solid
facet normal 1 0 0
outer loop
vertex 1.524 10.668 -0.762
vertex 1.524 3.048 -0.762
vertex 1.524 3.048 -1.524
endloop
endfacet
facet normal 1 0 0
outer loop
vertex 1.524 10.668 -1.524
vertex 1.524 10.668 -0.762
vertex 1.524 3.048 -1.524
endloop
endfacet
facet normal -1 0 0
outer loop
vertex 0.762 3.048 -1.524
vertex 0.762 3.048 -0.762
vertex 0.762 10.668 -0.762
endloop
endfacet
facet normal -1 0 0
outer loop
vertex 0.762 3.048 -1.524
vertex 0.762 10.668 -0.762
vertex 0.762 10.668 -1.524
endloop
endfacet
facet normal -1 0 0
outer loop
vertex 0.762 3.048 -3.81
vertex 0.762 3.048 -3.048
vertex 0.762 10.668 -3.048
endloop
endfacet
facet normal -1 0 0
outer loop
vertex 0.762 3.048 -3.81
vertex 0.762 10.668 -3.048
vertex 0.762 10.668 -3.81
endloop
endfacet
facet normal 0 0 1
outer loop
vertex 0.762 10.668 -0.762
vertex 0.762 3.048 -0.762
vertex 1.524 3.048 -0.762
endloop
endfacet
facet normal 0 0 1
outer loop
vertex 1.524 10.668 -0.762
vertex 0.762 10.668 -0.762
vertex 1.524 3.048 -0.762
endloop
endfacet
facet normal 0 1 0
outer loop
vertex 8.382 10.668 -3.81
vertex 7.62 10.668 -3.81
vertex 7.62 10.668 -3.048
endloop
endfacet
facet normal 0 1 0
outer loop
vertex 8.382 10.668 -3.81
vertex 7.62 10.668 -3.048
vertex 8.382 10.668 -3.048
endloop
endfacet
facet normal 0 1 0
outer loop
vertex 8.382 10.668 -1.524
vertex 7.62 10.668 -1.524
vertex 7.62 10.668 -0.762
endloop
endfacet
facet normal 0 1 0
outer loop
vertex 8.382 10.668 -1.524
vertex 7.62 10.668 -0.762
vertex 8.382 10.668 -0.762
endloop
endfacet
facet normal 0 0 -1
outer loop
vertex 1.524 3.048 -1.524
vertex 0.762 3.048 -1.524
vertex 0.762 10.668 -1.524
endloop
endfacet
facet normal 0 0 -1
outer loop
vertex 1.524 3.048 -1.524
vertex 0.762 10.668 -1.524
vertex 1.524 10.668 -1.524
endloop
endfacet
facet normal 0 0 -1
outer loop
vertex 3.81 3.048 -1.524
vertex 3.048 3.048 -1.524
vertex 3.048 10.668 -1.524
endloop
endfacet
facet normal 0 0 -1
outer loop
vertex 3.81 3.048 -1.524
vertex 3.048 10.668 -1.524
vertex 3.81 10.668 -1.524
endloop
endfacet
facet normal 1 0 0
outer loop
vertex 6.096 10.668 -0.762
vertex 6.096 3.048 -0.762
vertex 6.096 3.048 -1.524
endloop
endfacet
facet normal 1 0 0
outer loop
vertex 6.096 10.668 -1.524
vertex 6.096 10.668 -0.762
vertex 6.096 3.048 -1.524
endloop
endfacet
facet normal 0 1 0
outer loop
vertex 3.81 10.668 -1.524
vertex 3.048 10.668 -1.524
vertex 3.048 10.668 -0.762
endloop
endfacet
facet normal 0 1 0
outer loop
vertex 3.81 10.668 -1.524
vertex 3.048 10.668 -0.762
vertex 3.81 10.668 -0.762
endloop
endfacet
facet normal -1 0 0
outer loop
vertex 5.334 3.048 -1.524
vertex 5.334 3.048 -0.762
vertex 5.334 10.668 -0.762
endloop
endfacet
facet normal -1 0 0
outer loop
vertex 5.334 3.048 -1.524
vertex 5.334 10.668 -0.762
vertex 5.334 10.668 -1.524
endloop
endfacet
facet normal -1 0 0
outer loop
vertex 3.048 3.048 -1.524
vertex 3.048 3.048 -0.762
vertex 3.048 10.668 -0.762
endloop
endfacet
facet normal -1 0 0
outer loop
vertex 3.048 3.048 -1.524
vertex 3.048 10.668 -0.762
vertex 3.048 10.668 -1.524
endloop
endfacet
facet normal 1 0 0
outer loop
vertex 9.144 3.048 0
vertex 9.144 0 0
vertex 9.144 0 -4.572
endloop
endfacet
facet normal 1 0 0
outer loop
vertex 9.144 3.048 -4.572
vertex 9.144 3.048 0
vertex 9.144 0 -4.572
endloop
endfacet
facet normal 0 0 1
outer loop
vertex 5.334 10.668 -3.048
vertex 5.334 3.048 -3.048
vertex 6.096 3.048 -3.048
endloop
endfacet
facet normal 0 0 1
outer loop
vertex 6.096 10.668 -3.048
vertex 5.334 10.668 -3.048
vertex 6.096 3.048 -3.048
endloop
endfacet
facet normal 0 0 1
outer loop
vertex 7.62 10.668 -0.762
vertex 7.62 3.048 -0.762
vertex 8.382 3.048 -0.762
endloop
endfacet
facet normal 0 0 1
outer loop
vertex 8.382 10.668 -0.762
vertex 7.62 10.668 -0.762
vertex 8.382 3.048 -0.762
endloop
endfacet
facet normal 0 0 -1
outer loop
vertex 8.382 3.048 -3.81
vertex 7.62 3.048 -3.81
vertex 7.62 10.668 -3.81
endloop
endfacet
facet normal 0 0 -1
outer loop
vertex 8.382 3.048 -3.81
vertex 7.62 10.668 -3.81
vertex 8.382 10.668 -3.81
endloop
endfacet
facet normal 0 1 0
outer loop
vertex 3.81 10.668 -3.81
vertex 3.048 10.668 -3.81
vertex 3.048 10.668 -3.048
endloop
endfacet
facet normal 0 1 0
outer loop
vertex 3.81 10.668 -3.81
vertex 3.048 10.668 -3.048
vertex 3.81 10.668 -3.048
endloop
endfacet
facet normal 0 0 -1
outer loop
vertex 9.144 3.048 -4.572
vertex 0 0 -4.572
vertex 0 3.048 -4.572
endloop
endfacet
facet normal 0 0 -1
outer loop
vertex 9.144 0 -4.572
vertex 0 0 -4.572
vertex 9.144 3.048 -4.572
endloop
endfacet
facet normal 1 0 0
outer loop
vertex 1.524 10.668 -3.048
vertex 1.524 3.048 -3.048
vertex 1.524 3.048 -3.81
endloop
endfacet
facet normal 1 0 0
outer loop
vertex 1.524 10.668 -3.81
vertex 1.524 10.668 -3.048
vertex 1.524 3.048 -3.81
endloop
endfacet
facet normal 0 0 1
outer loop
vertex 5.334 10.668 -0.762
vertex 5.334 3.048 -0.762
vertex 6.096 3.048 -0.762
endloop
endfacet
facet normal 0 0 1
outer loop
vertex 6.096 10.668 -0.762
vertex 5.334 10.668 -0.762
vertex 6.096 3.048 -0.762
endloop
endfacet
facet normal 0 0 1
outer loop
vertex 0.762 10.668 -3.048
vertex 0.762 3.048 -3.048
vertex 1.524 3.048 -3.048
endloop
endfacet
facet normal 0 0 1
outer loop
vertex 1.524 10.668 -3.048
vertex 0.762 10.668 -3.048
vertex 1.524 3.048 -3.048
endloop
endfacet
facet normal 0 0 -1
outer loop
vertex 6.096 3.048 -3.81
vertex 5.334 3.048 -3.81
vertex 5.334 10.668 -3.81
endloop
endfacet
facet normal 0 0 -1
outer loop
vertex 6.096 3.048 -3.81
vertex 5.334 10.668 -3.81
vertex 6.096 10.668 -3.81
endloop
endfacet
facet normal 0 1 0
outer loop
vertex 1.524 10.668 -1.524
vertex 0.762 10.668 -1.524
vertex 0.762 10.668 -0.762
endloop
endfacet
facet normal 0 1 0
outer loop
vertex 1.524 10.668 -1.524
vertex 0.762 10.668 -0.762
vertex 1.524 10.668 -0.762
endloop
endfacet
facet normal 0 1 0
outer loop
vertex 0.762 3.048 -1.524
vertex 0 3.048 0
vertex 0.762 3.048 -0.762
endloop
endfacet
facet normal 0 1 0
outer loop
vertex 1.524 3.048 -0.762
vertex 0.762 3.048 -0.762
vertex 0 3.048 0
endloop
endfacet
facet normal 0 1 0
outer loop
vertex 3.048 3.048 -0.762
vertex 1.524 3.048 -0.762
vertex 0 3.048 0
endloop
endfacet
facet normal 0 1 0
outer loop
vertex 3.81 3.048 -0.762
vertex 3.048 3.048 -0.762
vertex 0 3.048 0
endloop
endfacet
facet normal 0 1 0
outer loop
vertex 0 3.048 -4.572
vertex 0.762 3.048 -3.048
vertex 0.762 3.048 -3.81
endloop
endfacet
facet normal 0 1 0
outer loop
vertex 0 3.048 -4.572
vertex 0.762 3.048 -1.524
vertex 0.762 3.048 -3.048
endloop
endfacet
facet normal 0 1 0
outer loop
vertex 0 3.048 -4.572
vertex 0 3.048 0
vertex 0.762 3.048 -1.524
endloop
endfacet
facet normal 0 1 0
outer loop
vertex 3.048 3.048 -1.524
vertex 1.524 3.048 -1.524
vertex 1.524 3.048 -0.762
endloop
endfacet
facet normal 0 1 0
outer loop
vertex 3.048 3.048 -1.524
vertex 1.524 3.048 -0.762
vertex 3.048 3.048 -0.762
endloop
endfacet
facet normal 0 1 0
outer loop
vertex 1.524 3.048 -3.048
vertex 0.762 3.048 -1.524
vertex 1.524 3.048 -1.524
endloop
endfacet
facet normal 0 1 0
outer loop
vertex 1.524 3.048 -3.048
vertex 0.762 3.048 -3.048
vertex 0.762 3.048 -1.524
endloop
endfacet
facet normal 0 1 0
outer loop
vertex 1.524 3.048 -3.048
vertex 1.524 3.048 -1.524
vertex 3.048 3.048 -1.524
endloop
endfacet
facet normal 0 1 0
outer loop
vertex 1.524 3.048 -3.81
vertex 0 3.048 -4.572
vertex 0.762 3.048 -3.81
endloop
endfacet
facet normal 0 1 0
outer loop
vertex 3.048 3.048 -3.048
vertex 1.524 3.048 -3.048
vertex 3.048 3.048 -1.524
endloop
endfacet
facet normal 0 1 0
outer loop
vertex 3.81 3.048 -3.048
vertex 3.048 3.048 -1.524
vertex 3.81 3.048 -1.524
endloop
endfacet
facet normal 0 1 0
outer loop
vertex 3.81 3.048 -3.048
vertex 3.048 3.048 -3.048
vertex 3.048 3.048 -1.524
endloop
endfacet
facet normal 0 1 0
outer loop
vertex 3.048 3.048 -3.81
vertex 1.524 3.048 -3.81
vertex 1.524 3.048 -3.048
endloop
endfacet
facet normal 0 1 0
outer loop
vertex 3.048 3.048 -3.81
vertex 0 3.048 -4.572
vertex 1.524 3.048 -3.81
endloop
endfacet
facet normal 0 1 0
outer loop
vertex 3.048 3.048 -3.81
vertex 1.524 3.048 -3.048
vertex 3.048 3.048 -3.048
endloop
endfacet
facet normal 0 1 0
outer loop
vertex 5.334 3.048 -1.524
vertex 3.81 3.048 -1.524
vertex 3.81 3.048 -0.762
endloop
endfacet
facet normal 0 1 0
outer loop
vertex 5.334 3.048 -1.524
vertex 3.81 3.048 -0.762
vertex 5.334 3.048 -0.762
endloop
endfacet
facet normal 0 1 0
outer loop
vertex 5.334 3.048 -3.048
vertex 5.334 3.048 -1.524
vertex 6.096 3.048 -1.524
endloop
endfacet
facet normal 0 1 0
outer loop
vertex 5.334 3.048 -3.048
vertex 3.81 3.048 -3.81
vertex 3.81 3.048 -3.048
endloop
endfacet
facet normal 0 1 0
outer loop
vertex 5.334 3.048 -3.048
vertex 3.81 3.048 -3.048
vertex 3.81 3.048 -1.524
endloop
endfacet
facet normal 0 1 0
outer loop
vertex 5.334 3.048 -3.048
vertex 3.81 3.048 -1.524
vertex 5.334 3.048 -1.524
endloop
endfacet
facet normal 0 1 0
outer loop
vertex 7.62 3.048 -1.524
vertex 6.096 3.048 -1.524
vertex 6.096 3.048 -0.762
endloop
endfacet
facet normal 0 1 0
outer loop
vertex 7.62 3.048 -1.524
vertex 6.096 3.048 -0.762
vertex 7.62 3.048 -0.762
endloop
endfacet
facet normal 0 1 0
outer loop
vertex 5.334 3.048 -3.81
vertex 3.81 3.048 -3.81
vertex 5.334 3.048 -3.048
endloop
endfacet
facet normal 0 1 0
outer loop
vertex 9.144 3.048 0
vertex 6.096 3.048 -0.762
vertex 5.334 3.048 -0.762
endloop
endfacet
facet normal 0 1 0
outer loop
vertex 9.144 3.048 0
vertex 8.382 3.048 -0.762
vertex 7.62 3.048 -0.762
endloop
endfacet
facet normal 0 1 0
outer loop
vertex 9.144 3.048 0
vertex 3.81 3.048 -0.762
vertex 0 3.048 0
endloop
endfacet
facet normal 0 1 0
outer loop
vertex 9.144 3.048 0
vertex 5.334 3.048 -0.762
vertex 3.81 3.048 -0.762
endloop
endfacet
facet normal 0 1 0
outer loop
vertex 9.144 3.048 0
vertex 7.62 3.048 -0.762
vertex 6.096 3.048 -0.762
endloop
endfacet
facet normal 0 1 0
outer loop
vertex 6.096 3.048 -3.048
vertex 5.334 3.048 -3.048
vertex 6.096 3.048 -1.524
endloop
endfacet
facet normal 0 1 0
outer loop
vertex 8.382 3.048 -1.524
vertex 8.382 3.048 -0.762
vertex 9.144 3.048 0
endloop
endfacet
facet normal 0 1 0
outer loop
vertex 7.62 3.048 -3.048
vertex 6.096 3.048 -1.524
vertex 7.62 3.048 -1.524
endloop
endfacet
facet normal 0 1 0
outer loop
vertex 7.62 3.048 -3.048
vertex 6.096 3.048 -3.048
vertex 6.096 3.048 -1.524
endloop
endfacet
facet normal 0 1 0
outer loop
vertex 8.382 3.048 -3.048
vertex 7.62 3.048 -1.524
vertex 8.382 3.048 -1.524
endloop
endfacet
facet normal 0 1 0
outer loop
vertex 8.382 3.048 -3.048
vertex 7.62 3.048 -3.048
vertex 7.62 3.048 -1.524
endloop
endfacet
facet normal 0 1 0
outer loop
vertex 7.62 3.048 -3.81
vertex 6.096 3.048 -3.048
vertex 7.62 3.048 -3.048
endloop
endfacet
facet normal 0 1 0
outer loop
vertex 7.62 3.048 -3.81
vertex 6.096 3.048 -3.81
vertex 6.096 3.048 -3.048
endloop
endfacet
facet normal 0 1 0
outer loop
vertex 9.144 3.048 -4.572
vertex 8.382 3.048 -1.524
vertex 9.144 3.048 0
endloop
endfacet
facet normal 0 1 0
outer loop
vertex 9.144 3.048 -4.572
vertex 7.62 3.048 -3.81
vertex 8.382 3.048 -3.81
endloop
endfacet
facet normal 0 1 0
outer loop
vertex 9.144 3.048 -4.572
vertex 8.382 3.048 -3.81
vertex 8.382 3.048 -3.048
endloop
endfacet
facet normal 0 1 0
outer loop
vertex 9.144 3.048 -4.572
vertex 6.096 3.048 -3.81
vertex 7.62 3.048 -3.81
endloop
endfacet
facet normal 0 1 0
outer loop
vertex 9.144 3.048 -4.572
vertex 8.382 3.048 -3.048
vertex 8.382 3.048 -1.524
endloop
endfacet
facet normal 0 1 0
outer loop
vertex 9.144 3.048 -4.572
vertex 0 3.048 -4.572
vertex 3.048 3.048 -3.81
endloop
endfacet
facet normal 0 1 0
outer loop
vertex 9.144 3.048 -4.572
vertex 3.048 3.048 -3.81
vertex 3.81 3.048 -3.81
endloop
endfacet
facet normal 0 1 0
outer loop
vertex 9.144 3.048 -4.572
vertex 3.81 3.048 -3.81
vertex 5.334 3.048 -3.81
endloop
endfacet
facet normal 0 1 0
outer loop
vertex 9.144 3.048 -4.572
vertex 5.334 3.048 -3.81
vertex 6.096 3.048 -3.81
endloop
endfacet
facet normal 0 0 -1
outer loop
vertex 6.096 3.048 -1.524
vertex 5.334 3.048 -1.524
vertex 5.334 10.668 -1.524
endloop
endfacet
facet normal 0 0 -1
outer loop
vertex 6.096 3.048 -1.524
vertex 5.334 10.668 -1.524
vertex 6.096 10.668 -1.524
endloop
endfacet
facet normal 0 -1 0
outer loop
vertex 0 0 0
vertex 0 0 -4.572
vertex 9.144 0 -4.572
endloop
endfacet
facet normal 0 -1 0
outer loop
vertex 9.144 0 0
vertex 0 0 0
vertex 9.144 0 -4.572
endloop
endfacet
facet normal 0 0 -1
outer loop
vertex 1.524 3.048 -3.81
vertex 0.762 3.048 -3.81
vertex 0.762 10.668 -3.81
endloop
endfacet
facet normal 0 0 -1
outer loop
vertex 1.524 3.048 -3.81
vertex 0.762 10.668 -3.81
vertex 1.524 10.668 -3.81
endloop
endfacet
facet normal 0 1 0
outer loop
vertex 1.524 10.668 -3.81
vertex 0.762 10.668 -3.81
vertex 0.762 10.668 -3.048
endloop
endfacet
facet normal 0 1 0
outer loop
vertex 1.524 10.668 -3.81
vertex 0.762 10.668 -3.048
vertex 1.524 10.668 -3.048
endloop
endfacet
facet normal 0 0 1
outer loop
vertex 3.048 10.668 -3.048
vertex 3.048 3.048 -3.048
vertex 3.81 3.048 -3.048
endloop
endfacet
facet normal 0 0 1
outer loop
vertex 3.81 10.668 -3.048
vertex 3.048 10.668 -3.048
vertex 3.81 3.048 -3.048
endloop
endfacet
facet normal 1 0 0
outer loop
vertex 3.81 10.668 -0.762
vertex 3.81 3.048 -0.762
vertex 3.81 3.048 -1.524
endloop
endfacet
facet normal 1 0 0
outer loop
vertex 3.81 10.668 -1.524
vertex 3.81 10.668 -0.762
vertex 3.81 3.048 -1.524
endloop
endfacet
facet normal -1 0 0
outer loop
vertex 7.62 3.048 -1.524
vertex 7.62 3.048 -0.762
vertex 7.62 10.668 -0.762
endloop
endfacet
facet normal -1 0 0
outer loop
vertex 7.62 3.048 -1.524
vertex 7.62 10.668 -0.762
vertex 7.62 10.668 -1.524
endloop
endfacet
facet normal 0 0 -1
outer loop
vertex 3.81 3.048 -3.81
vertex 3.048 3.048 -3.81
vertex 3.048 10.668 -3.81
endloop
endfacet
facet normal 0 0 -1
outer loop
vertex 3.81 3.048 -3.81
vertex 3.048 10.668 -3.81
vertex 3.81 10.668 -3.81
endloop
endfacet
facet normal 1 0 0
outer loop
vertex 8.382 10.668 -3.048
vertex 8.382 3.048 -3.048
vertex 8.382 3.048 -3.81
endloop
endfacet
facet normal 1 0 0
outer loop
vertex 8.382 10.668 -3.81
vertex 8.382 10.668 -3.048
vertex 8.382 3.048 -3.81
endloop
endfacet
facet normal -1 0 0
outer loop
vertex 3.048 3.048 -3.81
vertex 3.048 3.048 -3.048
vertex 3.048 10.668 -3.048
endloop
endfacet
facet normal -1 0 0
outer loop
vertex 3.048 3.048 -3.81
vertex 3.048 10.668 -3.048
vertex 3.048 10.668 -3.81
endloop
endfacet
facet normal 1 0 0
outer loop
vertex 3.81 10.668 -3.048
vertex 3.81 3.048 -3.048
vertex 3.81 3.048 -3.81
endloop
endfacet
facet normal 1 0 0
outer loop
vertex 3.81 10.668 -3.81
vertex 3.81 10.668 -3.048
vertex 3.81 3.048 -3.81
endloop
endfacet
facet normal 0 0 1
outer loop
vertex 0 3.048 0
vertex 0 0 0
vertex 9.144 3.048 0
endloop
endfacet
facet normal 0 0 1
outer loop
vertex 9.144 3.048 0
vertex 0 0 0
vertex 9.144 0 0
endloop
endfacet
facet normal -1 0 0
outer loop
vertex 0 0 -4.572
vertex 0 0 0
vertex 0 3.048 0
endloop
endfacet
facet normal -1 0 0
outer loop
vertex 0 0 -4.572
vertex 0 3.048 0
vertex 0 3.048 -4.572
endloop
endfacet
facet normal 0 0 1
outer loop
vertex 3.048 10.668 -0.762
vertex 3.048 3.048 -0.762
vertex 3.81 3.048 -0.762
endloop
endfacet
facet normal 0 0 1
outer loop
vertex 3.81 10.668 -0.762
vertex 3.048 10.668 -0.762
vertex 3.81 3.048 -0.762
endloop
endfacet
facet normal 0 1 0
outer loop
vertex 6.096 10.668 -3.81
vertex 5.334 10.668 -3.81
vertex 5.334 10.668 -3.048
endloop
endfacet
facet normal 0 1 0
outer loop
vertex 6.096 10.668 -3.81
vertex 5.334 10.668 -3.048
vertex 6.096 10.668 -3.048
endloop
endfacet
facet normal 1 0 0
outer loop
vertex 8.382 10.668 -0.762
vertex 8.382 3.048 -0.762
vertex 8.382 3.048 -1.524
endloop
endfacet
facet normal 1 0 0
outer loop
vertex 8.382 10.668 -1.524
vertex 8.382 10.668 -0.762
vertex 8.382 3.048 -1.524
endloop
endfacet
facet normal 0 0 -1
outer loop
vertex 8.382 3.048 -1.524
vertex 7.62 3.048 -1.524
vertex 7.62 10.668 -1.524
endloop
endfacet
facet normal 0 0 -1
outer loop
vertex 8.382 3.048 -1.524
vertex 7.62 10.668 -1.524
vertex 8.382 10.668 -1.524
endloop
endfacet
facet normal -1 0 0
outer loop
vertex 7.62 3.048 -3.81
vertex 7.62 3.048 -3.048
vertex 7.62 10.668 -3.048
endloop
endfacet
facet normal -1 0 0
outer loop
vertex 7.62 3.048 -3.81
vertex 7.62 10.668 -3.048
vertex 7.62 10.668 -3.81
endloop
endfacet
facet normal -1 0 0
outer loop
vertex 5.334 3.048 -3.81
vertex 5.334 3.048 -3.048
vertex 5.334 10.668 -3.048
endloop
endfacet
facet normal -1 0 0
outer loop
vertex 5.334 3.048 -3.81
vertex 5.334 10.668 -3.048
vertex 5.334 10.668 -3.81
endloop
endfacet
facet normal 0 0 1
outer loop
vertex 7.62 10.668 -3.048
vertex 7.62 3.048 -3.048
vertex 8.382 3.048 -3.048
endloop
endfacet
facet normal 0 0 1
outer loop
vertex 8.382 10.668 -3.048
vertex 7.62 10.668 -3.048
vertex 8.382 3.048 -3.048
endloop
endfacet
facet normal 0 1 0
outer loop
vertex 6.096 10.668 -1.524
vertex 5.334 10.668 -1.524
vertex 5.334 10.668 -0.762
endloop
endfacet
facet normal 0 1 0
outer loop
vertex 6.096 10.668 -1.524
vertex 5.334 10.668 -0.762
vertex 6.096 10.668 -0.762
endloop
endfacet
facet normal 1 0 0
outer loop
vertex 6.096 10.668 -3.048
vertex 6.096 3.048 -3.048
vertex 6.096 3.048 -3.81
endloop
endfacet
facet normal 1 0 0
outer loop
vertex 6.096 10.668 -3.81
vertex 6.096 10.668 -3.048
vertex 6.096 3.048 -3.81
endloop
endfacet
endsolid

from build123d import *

# Parameters (mm, degrees)
SKETCH1_W      = 9.144
SKETCH1_H      = 4.572
EXTRUDE1_DEPTH = 3.048
SKETCH2_W      = 0.762
SKETCH2_H      = 0.762
EXTRUDE2_DEPTH = 7.62


with BuildPart() as part:
    # Sketch1 → Extrude1 (new body)
    with BuildSketch(Plane(origin=(0, 0, 0), x_dir=(1, 0, 0), z_dir=(0, 1, 0))):
        with Locations((4.572, 2.286)):
            Rectangle(SKETCH1_W, SKETCH1_H)
    extrude(amount=EXTRUDE1_DEPTH)

    # Sketch2 → Extrude2 (add)
    with BuildSketch(Plane(origin=(0, 3.048, 0), x_dir=(1, 0, 0), z_dir=(0, 1, 0))):
        with Locations((3.429, 3.429)):
            Rectangle(SKETCH2_W, SKETCH2_H)
        with Locations((1.143, 3.429)):
            Rectangle(SKETCH2_W, SKETCH2_H)
        with Locations((5.715, 3.429)):
            Rectangle(SKETCH2_W, SKETCH2_H)
        with Locations((8.001, 3.429)):
            Rectangle(SKETCH2_W, SKETCH2_H)
        with Locations((1.143, 1.143)):
            Rectangle(SKETCH2_W, SKETCH2_H)
        with Locations((3.429, 1.143)):
            Rectangle(SKETCH2_W, SKETCH2_H)
        with Locations((5.715, 1.143)):
            Rectangle(SKETCH2_W, SKETCH2_H)
        with Locations((8.001, 1.143)):
            Rectangle(SKETCH2_W, SKETCH2_H)
    extrude(amount=EXTRUDE2_DEPTH)


solid = part.part
